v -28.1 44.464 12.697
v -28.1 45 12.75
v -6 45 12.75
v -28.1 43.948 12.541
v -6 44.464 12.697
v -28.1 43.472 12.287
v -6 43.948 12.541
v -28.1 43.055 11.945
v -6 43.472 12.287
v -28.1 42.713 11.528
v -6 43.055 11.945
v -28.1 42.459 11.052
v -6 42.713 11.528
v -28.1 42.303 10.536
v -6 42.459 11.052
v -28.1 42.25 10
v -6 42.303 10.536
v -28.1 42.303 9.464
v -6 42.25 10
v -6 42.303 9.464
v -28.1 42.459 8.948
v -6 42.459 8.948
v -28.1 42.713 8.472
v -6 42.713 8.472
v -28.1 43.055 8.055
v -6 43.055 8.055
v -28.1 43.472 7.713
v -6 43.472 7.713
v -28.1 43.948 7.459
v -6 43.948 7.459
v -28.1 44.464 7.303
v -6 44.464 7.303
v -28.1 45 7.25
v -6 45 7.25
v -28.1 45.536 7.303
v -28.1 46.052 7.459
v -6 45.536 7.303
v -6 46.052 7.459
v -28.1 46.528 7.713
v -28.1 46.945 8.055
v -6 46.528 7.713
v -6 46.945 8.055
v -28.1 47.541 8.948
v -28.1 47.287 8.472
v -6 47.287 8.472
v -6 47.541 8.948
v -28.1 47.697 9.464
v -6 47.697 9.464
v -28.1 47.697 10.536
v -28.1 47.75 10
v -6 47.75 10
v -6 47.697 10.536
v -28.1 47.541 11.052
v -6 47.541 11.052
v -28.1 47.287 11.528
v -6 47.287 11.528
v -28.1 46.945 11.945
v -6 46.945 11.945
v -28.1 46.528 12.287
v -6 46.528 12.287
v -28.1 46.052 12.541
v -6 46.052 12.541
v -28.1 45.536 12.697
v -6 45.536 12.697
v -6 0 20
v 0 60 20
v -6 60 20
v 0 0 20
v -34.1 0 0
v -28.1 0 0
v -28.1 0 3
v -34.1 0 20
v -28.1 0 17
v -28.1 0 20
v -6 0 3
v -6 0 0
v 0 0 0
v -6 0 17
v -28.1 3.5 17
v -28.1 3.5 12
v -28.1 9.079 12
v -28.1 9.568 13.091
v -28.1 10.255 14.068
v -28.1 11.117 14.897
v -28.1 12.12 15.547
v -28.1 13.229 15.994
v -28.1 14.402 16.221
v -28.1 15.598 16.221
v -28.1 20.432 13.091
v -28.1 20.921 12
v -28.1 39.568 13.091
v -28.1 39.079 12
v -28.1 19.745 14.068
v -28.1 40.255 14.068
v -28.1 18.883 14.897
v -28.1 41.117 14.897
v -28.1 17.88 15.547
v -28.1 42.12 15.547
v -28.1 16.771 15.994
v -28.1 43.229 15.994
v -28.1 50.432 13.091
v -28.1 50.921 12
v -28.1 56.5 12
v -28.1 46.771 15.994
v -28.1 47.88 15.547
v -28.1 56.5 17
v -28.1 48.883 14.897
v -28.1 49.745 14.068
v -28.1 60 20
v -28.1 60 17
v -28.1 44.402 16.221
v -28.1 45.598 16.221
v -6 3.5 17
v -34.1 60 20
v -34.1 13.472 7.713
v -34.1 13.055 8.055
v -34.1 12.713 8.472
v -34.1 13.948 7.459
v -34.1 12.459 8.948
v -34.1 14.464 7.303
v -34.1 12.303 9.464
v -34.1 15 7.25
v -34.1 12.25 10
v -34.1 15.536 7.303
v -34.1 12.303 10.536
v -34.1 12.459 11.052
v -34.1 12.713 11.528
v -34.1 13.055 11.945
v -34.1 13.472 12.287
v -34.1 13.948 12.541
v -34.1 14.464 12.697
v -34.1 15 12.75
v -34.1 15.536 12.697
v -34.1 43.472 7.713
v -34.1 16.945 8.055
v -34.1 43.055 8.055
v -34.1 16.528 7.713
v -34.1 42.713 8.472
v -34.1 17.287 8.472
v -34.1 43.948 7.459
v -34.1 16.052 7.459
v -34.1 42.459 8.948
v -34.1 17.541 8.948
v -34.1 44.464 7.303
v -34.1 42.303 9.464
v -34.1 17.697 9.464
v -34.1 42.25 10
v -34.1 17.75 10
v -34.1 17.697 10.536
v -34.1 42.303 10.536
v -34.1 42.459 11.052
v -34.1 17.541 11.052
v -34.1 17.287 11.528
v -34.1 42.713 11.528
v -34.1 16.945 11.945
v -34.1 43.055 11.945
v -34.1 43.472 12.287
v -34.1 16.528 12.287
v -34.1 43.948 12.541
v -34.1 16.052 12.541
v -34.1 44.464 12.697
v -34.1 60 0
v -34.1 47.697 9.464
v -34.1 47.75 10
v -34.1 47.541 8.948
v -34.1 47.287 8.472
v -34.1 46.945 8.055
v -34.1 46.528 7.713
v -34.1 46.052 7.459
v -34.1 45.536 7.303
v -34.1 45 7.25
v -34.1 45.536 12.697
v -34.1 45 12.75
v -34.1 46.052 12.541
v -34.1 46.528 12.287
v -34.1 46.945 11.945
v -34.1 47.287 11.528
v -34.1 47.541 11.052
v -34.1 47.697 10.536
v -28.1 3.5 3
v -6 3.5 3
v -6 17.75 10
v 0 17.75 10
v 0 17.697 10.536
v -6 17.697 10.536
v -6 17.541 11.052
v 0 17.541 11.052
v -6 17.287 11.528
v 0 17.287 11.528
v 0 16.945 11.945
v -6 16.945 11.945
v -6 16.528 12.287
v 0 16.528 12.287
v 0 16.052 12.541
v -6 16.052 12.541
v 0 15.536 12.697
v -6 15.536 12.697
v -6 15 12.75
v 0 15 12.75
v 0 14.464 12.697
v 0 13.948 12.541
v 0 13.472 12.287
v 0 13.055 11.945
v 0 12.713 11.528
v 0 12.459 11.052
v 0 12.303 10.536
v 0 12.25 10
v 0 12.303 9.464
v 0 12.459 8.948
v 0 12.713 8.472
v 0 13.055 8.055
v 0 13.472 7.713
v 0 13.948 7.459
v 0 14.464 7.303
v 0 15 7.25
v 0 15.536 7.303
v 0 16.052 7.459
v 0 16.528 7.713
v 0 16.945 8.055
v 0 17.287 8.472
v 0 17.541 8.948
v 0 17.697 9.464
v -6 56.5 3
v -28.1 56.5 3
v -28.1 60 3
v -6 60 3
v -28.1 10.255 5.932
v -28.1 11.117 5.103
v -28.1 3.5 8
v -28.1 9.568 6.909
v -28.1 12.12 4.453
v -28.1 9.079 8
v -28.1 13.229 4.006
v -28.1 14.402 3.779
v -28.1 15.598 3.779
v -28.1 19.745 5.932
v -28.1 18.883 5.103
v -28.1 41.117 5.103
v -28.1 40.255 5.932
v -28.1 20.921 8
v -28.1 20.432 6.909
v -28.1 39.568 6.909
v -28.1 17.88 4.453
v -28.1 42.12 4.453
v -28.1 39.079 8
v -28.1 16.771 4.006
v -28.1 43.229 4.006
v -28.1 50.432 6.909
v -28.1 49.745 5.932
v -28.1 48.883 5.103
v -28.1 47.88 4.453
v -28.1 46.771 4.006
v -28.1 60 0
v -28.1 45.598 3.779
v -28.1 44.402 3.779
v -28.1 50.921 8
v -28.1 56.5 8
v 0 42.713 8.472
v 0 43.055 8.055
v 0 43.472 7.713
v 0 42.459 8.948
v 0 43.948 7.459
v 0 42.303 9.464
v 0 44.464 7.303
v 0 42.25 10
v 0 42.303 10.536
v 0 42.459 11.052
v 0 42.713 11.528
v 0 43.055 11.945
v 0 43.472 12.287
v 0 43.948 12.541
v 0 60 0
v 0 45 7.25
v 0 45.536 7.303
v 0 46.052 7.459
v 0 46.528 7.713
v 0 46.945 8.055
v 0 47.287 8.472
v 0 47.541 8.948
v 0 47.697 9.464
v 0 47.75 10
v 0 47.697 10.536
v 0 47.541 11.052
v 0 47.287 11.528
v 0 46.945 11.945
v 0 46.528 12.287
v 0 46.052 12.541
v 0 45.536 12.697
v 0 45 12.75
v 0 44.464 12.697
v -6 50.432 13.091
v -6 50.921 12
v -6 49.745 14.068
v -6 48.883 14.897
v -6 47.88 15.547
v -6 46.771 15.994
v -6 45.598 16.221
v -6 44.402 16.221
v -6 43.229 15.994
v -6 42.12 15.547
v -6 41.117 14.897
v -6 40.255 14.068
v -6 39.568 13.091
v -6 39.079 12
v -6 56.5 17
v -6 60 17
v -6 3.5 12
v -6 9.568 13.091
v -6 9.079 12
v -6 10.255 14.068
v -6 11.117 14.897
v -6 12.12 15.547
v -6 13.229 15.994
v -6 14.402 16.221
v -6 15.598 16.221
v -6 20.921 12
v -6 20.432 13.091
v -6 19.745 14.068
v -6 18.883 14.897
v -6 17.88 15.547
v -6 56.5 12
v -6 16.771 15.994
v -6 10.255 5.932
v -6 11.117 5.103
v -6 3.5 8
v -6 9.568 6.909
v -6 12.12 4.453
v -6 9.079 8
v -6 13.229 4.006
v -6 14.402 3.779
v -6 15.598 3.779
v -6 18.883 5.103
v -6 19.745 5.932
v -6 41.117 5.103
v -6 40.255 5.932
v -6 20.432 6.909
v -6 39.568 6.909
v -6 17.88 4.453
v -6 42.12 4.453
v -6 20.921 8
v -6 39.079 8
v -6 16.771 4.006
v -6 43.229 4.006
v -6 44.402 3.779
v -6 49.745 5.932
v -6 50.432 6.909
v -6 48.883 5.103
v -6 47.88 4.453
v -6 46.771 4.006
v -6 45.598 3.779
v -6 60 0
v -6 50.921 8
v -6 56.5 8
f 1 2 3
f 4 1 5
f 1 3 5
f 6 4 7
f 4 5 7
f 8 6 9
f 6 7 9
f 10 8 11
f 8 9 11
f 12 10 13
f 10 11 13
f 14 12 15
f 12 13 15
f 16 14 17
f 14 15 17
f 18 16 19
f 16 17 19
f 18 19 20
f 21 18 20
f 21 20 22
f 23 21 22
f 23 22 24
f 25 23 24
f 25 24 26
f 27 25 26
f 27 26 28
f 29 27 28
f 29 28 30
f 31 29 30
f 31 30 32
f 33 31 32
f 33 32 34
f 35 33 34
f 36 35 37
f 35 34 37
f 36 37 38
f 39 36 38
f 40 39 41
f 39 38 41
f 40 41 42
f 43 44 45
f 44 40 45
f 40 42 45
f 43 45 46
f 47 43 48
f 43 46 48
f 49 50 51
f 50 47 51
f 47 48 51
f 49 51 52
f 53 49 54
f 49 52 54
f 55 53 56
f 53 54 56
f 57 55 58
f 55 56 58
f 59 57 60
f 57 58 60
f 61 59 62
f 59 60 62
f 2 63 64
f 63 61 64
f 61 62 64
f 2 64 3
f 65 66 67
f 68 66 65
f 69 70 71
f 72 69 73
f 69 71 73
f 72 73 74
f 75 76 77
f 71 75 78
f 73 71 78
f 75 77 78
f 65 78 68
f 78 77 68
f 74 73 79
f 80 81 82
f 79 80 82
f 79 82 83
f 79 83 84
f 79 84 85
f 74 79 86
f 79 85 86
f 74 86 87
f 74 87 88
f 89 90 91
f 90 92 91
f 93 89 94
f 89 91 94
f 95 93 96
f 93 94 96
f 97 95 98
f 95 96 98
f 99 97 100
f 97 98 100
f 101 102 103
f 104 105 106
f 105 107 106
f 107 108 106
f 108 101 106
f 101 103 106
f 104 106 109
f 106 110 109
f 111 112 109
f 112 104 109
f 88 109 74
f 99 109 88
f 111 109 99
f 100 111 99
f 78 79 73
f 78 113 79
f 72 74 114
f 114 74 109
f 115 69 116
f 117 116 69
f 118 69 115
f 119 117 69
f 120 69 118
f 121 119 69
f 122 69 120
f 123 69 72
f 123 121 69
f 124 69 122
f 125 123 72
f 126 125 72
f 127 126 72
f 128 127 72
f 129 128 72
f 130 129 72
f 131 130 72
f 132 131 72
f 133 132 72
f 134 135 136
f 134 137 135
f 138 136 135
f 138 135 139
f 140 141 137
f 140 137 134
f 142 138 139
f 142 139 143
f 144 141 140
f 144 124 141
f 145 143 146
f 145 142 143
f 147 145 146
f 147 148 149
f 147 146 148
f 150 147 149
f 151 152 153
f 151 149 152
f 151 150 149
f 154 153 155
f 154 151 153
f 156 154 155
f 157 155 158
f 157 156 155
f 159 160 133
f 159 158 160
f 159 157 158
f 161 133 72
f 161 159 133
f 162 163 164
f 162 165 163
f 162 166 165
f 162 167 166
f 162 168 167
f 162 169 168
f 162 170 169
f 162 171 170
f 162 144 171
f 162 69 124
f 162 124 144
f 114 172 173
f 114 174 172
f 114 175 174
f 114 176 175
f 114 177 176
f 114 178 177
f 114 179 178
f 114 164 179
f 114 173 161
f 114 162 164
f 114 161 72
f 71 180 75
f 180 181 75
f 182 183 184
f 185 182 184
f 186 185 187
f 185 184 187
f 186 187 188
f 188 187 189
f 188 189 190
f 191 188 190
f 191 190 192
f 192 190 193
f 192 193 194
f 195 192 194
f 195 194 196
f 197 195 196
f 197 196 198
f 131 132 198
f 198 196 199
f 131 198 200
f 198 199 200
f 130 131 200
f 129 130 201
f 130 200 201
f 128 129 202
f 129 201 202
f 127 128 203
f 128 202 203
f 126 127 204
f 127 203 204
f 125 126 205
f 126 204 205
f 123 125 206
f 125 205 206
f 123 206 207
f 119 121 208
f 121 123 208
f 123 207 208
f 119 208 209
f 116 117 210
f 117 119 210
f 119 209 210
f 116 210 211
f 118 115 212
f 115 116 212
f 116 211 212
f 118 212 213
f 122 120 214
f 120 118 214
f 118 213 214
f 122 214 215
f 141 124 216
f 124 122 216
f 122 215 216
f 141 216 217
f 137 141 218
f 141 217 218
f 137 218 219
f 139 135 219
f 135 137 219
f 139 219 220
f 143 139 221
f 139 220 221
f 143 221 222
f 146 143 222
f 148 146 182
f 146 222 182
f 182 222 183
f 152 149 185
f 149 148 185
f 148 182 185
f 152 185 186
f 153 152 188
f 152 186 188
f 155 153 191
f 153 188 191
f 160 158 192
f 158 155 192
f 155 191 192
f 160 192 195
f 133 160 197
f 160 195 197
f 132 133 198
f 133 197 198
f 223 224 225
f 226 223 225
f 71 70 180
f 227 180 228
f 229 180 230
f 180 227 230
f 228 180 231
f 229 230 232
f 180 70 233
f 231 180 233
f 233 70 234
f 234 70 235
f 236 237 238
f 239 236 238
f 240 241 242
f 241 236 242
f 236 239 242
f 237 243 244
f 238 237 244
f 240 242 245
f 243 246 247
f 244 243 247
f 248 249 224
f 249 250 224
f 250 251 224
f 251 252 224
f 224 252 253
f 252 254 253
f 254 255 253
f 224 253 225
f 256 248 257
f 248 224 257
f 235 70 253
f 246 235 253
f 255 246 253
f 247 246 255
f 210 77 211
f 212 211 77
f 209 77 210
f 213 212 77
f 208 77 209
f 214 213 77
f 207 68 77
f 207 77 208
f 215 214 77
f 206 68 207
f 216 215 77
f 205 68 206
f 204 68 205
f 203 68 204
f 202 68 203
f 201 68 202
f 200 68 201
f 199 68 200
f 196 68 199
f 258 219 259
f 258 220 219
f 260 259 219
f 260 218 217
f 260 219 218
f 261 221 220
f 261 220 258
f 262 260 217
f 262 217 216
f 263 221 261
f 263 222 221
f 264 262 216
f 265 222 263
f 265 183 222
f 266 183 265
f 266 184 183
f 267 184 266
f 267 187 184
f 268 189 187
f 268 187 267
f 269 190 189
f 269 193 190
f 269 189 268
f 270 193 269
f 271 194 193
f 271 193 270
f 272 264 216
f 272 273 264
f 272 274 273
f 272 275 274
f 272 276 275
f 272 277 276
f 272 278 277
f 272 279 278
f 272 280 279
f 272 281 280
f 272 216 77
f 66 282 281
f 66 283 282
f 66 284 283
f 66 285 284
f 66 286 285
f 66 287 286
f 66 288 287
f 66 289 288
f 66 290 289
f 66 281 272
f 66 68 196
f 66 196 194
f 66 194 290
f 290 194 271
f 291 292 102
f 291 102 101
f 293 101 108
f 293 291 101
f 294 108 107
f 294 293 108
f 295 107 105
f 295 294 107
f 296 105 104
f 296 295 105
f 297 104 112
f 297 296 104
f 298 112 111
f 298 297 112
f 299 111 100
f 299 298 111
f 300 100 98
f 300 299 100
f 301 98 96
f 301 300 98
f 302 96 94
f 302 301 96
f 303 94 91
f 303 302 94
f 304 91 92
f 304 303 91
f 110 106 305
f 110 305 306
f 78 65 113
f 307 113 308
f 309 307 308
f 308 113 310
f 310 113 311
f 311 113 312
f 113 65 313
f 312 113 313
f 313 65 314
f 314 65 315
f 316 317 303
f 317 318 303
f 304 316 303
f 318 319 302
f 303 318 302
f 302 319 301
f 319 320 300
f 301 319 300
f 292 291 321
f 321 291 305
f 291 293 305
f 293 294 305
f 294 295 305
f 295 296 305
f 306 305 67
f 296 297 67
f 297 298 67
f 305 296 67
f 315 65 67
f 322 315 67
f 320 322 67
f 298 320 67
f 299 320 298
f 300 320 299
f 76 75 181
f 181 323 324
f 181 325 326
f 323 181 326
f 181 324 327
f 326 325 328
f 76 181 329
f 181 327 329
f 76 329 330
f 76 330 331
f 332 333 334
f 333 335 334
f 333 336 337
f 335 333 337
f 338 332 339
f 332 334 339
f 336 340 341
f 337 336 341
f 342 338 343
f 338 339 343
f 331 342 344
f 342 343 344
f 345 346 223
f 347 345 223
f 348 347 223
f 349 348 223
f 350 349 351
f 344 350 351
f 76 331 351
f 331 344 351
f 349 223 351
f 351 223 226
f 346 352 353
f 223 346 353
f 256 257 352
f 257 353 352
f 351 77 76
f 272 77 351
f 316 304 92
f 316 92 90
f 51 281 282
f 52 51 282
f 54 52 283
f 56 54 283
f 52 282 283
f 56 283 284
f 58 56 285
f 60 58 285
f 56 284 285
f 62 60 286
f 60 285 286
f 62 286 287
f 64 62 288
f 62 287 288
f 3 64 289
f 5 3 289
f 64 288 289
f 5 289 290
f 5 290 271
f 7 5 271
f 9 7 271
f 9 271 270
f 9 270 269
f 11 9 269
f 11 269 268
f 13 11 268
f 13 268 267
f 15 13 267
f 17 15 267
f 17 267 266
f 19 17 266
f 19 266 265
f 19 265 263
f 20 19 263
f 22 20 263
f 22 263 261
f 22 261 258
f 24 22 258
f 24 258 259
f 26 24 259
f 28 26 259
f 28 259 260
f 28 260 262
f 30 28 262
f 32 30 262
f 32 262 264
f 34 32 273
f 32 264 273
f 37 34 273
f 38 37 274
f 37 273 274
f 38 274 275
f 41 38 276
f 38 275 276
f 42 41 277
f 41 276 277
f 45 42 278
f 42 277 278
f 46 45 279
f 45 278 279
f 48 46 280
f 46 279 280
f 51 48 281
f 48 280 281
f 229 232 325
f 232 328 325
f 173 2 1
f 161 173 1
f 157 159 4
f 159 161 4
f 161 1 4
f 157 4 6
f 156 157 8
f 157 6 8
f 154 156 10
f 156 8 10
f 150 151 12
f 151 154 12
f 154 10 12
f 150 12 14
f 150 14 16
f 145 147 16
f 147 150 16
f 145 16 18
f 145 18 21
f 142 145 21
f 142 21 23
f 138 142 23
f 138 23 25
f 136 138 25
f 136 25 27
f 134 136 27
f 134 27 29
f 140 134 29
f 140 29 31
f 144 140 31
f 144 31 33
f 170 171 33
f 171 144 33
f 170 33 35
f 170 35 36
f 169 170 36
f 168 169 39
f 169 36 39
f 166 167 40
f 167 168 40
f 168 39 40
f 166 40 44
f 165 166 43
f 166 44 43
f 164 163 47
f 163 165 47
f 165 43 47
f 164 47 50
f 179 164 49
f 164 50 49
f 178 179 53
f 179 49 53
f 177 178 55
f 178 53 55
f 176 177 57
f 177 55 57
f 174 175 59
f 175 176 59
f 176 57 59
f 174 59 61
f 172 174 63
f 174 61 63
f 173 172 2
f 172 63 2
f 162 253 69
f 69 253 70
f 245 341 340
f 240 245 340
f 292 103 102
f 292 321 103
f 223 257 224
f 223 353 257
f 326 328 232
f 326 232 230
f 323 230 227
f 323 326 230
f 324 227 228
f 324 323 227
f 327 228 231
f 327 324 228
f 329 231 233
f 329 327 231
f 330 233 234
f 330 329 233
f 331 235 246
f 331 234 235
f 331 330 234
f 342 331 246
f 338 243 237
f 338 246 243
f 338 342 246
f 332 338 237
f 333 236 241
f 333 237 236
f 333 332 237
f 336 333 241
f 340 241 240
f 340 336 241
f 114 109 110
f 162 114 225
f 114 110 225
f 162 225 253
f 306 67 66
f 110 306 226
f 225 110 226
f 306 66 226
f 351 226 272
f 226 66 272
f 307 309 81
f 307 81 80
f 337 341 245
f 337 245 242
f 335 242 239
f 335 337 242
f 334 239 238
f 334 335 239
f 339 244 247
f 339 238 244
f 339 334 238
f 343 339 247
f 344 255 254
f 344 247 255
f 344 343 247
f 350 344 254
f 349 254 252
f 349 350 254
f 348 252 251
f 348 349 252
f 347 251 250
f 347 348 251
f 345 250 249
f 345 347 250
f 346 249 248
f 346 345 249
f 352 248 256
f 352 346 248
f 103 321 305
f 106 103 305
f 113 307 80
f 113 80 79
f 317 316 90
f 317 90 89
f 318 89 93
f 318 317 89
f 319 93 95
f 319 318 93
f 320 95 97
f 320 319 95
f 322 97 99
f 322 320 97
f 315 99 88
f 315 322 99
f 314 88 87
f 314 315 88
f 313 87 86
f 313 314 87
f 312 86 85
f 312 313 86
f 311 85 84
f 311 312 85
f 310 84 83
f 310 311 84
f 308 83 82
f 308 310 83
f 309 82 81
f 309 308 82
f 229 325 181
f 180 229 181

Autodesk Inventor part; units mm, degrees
ref_plane "YZ Plane" through (0, 0, 0) normal (1, 0, 0) x (0, 1, 0)
ref_plane "XZ Plane" through (0, 0, 0) normal (0, 1, 0) x (-1, 0, 0)
ref_plane "XY Plane" through (0, 0, 0) normal (0, 0, 1) x (1, 0, 0)
sketch "Sketch1" plane through (0, 0, 0) normal (1, 0, 0) x (0, 1, 0)
  line L0 (0, 0) -> (60, 0)
  line L1 (60, 0) -> (60, 20)
  line L2 (60, 20) -> (0, 20)
  line L3 (0, 20) -> (0, 0)
  line L4 (60, 10) -> (0, 10) construction
  line L5 (60, 10) -> (30, 10) construction
  line L6 (30, 10) -> (0, 10) construction
  circle A0 centre (45, 10) radius 2.75
  circle A1 centre (15, 10) radius 2.75
  dimension "d0" = 60
  dimension "d1" = 20
  dimension "d2" = 5.5
  dimension "d3" = 5.5
extrude "Extrusion1" add sketch "Sketch1" against normal blind 6
sketch "Sketch2" plane through (-6, 0, 0) normal (-1, 0, 0) x (0, 0, 1)
  circle A0 centre (10, 45) radius 2.75 projected
  circle A1 centre (10, 15) radius 2.75 projected
  circle A2 centre (10, 45) radius 6.25
  circle A3 centre (10, 15) radius 6.25
  line L0 (20, 60) -> (0, 60) projected
  line L1 (12, 60) -> (12, 0)
  line L2 (8, 60) -> (8, 0)
  line L3 (0, 0) -> (20, 0) projected
  line L4 (0, 60) -> (0, 0) projected
  line L5 (20, 0) -> (20, 60) projected
  line L6 (12, 56.5) -> (17, 56.5)
  line L7 (17, 56.5) -> (17, 60)
  line L8 (8, 56.5) -> (3, 56.5)
  line L9 (3, 56.5) -> (3, 60)
  line L10 (8, 3.5) -> (3, 3.5)
  line L11 (3, 3.5) -> (3, 0)
  line L12 (12, 3.5) -> (17, 3.5)
  line L13 (17, 3.5) -> (17, 0)
  point P0 (12, 39.0786)
  point P1 (12, 50.9214)
  point P2 (8, 50.9214)
  point P3 (8, 39.0786)
  point P4 (8, 20.9214)
  point P5 (8, 9.0786)
  point P6 (12, 9.0786)
  point P7 (12, 20.9214)
  dimension "d6" = 3.5
  dimension "d7" = 8
  dimension "d8" = 8
  dimension "d9" = 3.5
  dimension "d10" = 3.5
  dimension "d11" = 3.5
  dimension "d16" = 3.5
extrude "Extrusion2" add sketch "Sketch2" along normal blind 22.1 contours A0 L1 A2 | A0 L2 A2 L1 | L1 A2 L2 A0 | A0 L2 A2 | A2 L2 L0 L1 | L1 A3 L2 A2 | L1 L0 L7 L6 | L1 A1 L2 A3 | A3 L1 A1 | L8 L9 L0 L2 | L2 A1 A3 | L2 A1 L1 A3 | A3 L1 L3 L2 | L2 L3 L11 L10 | L12 L13 L3 L1
sketch "Sketch3" plane through (-28.1, 0, 0) normal (-1, 0, 0) x (0, 0, 1)
  circle A0 centre (10, 45) radius 2.75 projected
  circle A1 centre (10, 15) radius 2.75 projected
  line L0 (20, 0) -> (20, 60) projected
  line L1 (17, 0) -> (20, 0) projected
  line L2 (3, 0) -> (17, 0) projected
  line L3 (0, 0) -> (3, 0) projected
  line L4 (0, 60) -> (0, 0) projected
  line L5 (3, 60) -> (0, 60) projected
  line L6 (17, 60) -> (3, 60) projected
  line L7 (20, 60) -> (17, 60) projected
extrude "Extrusion3" add sketch "Sketch3" along normal blind 6
equation "\"d3\" = d2"
equation "\"d16\" = d6"
properties part number "X Axis Belt and V Wheel Plate Spacer"
